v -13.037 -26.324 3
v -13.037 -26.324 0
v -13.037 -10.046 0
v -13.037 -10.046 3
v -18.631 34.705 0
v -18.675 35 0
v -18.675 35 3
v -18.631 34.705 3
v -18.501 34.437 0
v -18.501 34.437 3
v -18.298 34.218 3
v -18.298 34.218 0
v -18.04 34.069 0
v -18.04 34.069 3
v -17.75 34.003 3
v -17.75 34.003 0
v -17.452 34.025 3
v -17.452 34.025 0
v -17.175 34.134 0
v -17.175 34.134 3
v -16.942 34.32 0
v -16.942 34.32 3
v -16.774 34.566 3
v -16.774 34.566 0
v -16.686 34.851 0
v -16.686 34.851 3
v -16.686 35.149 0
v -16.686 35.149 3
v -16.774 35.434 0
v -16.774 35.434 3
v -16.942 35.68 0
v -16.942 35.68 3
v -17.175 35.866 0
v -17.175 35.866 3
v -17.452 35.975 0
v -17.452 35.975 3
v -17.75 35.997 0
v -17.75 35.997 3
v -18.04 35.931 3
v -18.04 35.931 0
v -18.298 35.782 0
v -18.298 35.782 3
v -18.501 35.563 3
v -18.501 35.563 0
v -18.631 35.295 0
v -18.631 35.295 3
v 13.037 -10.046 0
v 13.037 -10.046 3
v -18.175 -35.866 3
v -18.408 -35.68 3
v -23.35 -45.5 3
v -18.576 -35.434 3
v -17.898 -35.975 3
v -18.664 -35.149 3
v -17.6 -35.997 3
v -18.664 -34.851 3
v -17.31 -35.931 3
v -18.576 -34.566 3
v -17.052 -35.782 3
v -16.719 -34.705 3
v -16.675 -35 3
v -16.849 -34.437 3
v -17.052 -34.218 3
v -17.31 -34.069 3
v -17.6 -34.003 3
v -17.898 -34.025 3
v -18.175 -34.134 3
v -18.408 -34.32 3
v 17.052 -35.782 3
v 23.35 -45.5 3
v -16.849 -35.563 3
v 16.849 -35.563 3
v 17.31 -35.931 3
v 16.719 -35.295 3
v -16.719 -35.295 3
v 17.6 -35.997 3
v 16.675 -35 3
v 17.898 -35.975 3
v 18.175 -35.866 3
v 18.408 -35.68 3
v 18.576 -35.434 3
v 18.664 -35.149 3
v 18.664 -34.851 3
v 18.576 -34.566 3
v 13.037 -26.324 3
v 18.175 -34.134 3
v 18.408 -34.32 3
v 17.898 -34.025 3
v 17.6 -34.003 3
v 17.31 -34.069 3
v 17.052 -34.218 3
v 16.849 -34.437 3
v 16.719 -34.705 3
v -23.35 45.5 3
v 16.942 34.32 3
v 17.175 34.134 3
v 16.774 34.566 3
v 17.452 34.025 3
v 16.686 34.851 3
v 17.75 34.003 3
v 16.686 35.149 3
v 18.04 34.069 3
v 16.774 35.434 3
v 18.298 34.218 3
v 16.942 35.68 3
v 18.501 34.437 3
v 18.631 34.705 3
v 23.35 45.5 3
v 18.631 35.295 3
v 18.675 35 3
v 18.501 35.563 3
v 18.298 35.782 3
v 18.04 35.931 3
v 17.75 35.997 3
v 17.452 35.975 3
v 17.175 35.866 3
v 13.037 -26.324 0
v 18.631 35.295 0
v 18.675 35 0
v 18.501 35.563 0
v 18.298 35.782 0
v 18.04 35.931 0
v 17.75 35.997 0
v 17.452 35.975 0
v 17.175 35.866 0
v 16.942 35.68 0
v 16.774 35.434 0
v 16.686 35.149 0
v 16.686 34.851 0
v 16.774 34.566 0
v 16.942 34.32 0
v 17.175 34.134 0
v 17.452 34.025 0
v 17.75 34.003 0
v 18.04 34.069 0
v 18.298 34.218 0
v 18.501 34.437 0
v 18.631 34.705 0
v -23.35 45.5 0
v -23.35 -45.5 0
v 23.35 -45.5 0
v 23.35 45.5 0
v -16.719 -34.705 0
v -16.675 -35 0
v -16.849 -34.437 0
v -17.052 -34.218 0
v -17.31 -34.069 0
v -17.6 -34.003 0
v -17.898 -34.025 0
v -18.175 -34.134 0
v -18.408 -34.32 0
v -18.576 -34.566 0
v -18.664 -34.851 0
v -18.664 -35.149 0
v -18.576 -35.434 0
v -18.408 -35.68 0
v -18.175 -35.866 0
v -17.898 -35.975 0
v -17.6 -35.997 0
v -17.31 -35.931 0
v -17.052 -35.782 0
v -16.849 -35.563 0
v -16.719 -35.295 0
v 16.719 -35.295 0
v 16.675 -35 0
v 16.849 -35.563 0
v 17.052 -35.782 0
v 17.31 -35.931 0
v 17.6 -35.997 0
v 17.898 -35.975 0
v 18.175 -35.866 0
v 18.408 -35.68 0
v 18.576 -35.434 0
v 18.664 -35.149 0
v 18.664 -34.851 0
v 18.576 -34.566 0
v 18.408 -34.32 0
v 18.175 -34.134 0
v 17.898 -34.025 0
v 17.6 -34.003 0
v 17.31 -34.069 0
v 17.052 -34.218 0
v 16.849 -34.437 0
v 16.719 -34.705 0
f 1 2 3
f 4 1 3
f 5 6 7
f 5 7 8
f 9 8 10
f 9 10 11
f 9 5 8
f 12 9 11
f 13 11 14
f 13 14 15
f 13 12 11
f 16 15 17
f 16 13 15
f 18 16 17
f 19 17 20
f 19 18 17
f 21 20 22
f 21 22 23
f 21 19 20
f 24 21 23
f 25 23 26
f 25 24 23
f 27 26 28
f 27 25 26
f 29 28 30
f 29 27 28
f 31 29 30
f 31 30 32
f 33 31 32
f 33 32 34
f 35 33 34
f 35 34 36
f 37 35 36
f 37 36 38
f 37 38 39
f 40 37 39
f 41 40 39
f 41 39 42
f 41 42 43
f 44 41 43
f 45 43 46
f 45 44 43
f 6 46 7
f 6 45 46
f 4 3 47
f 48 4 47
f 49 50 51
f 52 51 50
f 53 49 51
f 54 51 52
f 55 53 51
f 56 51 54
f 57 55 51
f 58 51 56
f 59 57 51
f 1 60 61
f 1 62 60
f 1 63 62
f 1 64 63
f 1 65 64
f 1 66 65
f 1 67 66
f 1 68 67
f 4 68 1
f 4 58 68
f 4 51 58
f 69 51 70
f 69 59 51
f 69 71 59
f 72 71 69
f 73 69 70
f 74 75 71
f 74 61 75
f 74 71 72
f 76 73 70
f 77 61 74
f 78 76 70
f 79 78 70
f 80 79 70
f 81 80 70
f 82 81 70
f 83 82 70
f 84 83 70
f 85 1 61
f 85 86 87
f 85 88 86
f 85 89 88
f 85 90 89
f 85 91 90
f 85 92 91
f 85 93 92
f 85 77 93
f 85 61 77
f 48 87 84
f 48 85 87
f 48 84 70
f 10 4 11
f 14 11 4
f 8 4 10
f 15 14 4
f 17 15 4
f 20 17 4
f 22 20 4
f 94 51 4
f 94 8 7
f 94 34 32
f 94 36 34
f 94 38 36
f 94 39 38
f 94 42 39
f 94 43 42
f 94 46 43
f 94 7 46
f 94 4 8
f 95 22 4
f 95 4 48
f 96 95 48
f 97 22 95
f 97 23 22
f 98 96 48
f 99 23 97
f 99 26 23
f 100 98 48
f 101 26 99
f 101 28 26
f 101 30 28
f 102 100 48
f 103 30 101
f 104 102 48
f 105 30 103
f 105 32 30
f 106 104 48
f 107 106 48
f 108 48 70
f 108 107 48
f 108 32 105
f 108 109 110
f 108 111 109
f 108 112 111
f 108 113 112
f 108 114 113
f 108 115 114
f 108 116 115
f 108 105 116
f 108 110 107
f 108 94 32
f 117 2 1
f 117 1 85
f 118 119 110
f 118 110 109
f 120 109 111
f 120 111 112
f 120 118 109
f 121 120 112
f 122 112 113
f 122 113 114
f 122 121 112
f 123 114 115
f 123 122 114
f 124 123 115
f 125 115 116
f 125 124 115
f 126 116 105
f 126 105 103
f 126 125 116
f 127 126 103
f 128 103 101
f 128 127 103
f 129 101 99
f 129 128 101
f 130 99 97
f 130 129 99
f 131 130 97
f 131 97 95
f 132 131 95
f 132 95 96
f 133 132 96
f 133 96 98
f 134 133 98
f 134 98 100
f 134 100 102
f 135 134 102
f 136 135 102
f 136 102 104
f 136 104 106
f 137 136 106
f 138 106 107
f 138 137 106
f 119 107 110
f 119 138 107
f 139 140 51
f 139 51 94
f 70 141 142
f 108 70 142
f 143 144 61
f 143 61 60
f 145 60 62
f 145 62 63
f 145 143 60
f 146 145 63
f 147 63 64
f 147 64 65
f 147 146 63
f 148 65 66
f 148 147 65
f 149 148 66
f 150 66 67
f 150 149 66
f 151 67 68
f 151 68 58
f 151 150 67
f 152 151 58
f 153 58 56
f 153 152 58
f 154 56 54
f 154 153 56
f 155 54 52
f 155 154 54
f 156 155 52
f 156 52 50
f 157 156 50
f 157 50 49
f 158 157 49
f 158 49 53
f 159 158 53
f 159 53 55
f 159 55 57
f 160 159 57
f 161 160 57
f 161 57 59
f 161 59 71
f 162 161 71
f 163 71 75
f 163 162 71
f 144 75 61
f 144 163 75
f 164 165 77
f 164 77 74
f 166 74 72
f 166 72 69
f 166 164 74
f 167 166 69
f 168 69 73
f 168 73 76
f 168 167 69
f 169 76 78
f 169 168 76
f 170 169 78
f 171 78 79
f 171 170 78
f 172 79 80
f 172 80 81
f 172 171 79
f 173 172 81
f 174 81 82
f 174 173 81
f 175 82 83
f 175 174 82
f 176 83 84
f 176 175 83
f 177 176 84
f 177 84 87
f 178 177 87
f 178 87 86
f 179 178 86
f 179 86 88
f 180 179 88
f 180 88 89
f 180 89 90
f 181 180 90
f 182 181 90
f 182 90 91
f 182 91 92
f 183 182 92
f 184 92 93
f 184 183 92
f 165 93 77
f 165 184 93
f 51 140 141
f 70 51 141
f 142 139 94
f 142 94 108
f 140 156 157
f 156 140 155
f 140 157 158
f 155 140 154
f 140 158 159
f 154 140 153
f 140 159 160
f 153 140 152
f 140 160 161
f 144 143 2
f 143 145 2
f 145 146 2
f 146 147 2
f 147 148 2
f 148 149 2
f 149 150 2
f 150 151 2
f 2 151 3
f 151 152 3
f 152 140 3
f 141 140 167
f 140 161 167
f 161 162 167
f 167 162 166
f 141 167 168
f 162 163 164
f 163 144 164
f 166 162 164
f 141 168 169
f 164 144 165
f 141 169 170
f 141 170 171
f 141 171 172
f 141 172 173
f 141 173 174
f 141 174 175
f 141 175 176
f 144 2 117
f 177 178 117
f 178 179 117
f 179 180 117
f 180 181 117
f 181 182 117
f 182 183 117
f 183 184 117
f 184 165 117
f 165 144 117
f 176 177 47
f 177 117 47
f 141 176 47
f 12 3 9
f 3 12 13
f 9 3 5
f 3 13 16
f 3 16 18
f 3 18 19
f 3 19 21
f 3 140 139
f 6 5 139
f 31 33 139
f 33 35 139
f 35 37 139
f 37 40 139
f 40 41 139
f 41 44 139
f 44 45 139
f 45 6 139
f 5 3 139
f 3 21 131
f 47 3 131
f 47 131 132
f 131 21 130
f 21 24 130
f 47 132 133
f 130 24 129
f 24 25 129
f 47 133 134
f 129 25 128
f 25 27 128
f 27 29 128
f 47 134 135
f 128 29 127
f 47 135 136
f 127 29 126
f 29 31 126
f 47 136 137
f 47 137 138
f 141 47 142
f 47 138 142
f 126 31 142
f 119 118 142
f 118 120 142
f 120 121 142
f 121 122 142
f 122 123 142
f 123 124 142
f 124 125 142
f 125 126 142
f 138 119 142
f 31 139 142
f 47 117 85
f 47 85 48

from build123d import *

# Parameters (mm, degrees)
SKETCH2_W           = 46.7
SKETCH2_H           = 91
SKETCH2_R           = 1
SKETCH2_W_2         = 26.073503968
SKETCH2_H_2         = 16.277986644
BOSS_EXTRUDE1_DEPTH = 3


with BuildPart() as part:
    # Sketch2 → Boss-Extrude1 (new body)
    with BuildSketch(Plane.XY):
        Rectangle(SKETCH2_W, SKETCH2_H)
        with Locations((17.675, 35)):
            Circle(SKETCH2_R, mode=Mode.SUBTRACT)
        with Locations(Location((-17.675, 35, 0), (0, 0, 180))):
            Circle(SKETCH2_R, mode=Mode.SUBTRACT)
        with Locations((-17.675, -35)):
            Circle(SKETCH2_R, mode=Mode.SUBTRACT)
        with Locations(Location((17.675, -35, 0), (0, 0, 180))):
            Circle(SKETCH2_R, mode=Mode.SUBTRACT)
        with Locations((0, -18.185085705)):
            Rectangle(SKETCH2_W_2, SKETCH2_H_2, mode=Mode.SUBTRACT)
    extrude(amount=BOSS_EXTRUDE1_DEPTH)


solid = part.part
